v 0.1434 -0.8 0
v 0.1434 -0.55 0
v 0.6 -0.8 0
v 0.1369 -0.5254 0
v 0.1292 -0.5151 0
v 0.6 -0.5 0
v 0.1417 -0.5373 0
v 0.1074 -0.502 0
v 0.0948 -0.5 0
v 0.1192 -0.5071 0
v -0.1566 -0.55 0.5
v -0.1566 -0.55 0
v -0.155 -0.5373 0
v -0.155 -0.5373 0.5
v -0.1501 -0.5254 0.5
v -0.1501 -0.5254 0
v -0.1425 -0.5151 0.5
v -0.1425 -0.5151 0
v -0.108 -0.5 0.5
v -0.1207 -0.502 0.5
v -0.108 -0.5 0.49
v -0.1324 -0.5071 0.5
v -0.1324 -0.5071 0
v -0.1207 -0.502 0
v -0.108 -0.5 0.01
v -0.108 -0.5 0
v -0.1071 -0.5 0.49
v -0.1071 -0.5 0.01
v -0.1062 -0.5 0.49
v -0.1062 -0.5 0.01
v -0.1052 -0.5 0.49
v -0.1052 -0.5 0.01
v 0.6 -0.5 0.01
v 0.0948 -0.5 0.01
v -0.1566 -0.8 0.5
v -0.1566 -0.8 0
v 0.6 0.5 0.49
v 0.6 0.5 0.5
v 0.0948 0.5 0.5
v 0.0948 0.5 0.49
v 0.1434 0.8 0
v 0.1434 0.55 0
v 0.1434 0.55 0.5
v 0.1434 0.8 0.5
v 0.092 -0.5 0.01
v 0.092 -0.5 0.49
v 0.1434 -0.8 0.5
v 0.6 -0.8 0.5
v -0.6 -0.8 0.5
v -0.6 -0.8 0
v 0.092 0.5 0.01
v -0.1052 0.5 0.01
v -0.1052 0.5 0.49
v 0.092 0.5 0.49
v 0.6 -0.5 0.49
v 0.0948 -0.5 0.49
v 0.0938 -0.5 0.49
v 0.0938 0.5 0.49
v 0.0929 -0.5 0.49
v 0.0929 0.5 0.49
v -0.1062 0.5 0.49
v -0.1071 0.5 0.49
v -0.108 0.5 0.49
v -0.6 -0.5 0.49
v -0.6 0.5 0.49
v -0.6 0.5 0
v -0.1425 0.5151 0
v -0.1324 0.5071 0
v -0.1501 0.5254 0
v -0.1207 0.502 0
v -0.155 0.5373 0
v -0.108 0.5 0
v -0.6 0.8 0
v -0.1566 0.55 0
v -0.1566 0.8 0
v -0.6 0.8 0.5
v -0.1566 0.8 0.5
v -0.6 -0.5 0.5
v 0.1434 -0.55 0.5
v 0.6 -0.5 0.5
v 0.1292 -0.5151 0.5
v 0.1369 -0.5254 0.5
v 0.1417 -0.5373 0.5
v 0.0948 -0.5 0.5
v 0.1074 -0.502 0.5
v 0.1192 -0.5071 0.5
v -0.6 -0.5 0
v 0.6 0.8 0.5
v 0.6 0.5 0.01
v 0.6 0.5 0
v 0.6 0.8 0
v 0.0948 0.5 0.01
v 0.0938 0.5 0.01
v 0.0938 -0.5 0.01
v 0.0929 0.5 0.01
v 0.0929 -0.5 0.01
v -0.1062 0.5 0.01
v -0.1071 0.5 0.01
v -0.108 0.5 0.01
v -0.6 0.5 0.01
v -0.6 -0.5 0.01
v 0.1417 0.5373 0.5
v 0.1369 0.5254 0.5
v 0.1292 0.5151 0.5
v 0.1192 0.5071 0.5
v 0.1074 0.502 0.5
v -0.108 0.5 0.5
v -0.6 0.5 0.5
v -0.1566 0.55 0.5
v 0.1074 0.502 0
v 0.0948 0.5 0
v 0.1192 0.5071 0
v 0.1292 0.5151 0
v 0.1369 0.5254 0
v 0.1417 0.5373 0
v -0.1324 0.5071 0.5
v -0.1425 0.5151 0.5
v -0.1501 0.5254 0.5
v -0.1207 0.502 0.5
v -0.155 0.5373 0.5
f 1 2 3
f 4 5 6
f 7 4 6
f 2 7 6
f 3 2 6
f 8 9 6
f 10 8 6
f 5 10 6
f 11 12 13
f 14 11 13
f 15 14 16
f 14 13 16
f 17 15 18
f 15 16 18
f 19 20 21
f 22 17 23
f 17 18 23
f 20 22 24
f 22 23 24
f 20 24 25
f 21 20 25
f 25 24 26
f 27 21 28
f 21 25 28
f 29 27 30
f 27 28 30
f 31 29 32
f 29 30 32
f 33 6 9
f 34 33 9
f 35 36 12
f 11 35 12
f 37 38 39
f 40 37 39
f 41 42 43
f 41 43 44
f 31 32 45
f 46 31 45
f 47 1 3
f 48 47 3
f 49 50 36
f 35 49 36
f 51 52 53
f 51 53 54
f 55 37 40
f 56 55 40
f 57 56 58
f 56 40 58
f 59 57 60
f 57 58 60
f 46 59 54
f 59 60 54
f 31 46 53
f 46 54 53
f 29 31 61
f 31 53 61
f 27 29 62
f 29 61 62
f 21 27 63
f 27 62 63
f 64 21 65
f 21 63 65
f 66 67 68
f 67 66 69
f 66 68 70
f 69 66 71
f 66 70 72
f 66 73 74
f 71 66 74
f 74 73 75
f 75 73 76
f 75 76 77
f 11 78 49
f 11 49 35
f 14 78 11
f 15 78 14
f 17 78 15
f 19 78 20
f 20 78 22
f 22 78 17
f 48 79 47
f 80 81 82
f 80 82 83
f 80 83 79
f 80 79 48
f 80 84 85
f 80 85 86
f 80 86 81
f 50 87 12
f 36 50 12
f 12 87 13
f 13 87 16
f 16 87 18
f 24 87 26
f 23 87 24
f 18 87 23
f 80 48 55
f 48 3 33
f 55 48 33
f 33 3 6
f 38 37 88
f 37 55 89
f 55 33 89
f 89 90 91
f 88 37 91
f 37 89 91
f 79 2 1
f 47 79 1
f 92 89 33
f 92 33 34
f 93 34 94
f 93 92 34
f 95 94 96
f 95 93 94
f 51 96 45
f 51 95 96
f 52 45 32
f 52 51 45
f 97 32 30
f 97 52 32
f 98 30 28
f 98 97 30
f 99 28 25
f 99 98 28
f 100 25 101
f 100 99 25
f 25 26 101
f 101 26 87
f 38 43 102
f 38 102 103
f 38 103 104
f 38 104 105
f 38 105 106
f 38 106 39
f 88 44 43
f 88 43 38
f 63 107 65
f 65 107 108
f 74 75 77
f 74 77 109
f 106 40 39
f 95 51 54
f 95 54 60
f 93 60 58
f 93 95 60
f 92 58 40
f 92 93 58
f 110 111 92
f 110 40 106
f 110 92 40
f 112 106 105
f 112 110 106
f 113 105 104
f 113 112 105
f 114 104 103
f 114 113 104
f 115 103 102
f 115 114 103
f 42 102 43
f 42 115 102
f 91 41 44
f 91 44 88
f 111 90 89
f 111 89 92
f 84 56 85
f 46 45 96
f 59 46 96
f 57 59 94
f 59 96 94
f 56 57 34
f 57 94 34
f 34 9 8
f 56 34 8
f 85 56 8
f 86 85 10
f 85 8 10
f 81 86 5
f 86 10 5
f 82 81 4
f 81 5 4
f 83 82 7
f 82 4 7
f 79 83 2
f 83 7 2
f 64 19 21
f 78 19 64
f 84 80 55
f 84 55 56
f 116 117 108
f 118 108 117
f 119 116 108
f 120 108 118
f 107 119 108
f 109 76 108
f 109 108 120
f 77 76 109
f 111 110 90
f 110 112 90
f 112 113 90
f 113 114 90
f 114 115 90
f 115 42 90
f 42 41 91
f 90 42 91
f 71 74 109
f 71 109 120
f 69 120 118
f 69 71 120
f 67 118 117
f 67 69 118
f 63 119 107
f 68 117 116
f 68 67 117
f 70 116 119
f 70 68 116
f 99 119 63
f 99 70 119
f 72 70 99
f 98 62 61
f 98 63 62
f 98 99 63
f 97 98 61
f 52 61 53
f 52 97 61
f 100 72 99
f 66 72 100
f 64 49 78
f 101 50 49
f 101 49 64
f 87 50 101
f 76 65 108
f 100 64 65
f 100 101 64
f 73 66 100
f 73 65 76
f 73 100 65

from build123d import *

# Parameters (mm, degrees)
SKETCH1_W           = 1.2
SKETCH1_H           = 1.6
BOSS_EXTRUDE1_DEPTH = 0.5
CUT_EXTRUDE1_DEPTH  = 1.5
SKETCH3_W           = 1.2
SKETCH3_H           = 1
CUT_EXTRUDE2_DEPTH  = 0.01


with BuildPart() as part:
    # Sketch1 → Boss-Extrude1 (new body)
    with BuildSketch(Plane.XY):
        Rectangle(SKETCH1_W, SKETCH1_H)
    extrude(amount=BOSS_EXTRUDE1_DEPTH)

    # Sketch2 → Cut-Extrude1 (cut, through all)
    with BuildSketch(Plane(origin=(0, 0, 0), x_dir=(-1, 0, 0), z_dir=(0, 0, -1))):
        with BuildLine():
            Line((0.156619149, 0.8), (0.156619149, 0.549979938))
            ThreePointArc((0.156619149, 0.549979938), (0.14148119, 0.514138446), (0.105233781, 0.5))
            Line((0.105233781, 0.5), (-0.091995219, 0.5))
            ThreePointArc((-0.091995219, 0.5), (-0.128242628, 0.514138446), (-0.143380586, 0.549979938))
            Line((-0.143380586, 0.549979938), (-0.143380851, 0.8))
            Line((-0.143380851, 0.8), (0.156619149, 0.8))
        make_face()
    cut_extrude1 = extrude(amount=-CUT_EXTRUDE1_DEPTH, mode=Mode.SUBTRACT)

    # Sketch3 → Cut-Extrude2 (cut)
    with BuildSketch(Plane(origin=(0, 0, 0), x_dir=(-1, 0, 0), z_dir=(0, 0, -1))):
        Rectangle(SKETCH3_W, SKETCH3_H)
    cut_extrude2 = extrude(amount=-CUT_EXTRUDE2_DEPTH, mode=Mode.SUBTRACT)

    # Mirror0: Cut-Extrude1 across plane
    add(cut_extrude1.mirror(Plane.ZX), mode=Mode.SUBTRACT)

    # Mirror1: Cut-Extrude2 across plane
    add(cut_extrude2.mirror(Plane(origin=(0, 0, 0.25), x_dir=(1, 0, 0), z_dir=(0, 0, -1))), mode=Mode.SUBTRACT)


solid = part.part
